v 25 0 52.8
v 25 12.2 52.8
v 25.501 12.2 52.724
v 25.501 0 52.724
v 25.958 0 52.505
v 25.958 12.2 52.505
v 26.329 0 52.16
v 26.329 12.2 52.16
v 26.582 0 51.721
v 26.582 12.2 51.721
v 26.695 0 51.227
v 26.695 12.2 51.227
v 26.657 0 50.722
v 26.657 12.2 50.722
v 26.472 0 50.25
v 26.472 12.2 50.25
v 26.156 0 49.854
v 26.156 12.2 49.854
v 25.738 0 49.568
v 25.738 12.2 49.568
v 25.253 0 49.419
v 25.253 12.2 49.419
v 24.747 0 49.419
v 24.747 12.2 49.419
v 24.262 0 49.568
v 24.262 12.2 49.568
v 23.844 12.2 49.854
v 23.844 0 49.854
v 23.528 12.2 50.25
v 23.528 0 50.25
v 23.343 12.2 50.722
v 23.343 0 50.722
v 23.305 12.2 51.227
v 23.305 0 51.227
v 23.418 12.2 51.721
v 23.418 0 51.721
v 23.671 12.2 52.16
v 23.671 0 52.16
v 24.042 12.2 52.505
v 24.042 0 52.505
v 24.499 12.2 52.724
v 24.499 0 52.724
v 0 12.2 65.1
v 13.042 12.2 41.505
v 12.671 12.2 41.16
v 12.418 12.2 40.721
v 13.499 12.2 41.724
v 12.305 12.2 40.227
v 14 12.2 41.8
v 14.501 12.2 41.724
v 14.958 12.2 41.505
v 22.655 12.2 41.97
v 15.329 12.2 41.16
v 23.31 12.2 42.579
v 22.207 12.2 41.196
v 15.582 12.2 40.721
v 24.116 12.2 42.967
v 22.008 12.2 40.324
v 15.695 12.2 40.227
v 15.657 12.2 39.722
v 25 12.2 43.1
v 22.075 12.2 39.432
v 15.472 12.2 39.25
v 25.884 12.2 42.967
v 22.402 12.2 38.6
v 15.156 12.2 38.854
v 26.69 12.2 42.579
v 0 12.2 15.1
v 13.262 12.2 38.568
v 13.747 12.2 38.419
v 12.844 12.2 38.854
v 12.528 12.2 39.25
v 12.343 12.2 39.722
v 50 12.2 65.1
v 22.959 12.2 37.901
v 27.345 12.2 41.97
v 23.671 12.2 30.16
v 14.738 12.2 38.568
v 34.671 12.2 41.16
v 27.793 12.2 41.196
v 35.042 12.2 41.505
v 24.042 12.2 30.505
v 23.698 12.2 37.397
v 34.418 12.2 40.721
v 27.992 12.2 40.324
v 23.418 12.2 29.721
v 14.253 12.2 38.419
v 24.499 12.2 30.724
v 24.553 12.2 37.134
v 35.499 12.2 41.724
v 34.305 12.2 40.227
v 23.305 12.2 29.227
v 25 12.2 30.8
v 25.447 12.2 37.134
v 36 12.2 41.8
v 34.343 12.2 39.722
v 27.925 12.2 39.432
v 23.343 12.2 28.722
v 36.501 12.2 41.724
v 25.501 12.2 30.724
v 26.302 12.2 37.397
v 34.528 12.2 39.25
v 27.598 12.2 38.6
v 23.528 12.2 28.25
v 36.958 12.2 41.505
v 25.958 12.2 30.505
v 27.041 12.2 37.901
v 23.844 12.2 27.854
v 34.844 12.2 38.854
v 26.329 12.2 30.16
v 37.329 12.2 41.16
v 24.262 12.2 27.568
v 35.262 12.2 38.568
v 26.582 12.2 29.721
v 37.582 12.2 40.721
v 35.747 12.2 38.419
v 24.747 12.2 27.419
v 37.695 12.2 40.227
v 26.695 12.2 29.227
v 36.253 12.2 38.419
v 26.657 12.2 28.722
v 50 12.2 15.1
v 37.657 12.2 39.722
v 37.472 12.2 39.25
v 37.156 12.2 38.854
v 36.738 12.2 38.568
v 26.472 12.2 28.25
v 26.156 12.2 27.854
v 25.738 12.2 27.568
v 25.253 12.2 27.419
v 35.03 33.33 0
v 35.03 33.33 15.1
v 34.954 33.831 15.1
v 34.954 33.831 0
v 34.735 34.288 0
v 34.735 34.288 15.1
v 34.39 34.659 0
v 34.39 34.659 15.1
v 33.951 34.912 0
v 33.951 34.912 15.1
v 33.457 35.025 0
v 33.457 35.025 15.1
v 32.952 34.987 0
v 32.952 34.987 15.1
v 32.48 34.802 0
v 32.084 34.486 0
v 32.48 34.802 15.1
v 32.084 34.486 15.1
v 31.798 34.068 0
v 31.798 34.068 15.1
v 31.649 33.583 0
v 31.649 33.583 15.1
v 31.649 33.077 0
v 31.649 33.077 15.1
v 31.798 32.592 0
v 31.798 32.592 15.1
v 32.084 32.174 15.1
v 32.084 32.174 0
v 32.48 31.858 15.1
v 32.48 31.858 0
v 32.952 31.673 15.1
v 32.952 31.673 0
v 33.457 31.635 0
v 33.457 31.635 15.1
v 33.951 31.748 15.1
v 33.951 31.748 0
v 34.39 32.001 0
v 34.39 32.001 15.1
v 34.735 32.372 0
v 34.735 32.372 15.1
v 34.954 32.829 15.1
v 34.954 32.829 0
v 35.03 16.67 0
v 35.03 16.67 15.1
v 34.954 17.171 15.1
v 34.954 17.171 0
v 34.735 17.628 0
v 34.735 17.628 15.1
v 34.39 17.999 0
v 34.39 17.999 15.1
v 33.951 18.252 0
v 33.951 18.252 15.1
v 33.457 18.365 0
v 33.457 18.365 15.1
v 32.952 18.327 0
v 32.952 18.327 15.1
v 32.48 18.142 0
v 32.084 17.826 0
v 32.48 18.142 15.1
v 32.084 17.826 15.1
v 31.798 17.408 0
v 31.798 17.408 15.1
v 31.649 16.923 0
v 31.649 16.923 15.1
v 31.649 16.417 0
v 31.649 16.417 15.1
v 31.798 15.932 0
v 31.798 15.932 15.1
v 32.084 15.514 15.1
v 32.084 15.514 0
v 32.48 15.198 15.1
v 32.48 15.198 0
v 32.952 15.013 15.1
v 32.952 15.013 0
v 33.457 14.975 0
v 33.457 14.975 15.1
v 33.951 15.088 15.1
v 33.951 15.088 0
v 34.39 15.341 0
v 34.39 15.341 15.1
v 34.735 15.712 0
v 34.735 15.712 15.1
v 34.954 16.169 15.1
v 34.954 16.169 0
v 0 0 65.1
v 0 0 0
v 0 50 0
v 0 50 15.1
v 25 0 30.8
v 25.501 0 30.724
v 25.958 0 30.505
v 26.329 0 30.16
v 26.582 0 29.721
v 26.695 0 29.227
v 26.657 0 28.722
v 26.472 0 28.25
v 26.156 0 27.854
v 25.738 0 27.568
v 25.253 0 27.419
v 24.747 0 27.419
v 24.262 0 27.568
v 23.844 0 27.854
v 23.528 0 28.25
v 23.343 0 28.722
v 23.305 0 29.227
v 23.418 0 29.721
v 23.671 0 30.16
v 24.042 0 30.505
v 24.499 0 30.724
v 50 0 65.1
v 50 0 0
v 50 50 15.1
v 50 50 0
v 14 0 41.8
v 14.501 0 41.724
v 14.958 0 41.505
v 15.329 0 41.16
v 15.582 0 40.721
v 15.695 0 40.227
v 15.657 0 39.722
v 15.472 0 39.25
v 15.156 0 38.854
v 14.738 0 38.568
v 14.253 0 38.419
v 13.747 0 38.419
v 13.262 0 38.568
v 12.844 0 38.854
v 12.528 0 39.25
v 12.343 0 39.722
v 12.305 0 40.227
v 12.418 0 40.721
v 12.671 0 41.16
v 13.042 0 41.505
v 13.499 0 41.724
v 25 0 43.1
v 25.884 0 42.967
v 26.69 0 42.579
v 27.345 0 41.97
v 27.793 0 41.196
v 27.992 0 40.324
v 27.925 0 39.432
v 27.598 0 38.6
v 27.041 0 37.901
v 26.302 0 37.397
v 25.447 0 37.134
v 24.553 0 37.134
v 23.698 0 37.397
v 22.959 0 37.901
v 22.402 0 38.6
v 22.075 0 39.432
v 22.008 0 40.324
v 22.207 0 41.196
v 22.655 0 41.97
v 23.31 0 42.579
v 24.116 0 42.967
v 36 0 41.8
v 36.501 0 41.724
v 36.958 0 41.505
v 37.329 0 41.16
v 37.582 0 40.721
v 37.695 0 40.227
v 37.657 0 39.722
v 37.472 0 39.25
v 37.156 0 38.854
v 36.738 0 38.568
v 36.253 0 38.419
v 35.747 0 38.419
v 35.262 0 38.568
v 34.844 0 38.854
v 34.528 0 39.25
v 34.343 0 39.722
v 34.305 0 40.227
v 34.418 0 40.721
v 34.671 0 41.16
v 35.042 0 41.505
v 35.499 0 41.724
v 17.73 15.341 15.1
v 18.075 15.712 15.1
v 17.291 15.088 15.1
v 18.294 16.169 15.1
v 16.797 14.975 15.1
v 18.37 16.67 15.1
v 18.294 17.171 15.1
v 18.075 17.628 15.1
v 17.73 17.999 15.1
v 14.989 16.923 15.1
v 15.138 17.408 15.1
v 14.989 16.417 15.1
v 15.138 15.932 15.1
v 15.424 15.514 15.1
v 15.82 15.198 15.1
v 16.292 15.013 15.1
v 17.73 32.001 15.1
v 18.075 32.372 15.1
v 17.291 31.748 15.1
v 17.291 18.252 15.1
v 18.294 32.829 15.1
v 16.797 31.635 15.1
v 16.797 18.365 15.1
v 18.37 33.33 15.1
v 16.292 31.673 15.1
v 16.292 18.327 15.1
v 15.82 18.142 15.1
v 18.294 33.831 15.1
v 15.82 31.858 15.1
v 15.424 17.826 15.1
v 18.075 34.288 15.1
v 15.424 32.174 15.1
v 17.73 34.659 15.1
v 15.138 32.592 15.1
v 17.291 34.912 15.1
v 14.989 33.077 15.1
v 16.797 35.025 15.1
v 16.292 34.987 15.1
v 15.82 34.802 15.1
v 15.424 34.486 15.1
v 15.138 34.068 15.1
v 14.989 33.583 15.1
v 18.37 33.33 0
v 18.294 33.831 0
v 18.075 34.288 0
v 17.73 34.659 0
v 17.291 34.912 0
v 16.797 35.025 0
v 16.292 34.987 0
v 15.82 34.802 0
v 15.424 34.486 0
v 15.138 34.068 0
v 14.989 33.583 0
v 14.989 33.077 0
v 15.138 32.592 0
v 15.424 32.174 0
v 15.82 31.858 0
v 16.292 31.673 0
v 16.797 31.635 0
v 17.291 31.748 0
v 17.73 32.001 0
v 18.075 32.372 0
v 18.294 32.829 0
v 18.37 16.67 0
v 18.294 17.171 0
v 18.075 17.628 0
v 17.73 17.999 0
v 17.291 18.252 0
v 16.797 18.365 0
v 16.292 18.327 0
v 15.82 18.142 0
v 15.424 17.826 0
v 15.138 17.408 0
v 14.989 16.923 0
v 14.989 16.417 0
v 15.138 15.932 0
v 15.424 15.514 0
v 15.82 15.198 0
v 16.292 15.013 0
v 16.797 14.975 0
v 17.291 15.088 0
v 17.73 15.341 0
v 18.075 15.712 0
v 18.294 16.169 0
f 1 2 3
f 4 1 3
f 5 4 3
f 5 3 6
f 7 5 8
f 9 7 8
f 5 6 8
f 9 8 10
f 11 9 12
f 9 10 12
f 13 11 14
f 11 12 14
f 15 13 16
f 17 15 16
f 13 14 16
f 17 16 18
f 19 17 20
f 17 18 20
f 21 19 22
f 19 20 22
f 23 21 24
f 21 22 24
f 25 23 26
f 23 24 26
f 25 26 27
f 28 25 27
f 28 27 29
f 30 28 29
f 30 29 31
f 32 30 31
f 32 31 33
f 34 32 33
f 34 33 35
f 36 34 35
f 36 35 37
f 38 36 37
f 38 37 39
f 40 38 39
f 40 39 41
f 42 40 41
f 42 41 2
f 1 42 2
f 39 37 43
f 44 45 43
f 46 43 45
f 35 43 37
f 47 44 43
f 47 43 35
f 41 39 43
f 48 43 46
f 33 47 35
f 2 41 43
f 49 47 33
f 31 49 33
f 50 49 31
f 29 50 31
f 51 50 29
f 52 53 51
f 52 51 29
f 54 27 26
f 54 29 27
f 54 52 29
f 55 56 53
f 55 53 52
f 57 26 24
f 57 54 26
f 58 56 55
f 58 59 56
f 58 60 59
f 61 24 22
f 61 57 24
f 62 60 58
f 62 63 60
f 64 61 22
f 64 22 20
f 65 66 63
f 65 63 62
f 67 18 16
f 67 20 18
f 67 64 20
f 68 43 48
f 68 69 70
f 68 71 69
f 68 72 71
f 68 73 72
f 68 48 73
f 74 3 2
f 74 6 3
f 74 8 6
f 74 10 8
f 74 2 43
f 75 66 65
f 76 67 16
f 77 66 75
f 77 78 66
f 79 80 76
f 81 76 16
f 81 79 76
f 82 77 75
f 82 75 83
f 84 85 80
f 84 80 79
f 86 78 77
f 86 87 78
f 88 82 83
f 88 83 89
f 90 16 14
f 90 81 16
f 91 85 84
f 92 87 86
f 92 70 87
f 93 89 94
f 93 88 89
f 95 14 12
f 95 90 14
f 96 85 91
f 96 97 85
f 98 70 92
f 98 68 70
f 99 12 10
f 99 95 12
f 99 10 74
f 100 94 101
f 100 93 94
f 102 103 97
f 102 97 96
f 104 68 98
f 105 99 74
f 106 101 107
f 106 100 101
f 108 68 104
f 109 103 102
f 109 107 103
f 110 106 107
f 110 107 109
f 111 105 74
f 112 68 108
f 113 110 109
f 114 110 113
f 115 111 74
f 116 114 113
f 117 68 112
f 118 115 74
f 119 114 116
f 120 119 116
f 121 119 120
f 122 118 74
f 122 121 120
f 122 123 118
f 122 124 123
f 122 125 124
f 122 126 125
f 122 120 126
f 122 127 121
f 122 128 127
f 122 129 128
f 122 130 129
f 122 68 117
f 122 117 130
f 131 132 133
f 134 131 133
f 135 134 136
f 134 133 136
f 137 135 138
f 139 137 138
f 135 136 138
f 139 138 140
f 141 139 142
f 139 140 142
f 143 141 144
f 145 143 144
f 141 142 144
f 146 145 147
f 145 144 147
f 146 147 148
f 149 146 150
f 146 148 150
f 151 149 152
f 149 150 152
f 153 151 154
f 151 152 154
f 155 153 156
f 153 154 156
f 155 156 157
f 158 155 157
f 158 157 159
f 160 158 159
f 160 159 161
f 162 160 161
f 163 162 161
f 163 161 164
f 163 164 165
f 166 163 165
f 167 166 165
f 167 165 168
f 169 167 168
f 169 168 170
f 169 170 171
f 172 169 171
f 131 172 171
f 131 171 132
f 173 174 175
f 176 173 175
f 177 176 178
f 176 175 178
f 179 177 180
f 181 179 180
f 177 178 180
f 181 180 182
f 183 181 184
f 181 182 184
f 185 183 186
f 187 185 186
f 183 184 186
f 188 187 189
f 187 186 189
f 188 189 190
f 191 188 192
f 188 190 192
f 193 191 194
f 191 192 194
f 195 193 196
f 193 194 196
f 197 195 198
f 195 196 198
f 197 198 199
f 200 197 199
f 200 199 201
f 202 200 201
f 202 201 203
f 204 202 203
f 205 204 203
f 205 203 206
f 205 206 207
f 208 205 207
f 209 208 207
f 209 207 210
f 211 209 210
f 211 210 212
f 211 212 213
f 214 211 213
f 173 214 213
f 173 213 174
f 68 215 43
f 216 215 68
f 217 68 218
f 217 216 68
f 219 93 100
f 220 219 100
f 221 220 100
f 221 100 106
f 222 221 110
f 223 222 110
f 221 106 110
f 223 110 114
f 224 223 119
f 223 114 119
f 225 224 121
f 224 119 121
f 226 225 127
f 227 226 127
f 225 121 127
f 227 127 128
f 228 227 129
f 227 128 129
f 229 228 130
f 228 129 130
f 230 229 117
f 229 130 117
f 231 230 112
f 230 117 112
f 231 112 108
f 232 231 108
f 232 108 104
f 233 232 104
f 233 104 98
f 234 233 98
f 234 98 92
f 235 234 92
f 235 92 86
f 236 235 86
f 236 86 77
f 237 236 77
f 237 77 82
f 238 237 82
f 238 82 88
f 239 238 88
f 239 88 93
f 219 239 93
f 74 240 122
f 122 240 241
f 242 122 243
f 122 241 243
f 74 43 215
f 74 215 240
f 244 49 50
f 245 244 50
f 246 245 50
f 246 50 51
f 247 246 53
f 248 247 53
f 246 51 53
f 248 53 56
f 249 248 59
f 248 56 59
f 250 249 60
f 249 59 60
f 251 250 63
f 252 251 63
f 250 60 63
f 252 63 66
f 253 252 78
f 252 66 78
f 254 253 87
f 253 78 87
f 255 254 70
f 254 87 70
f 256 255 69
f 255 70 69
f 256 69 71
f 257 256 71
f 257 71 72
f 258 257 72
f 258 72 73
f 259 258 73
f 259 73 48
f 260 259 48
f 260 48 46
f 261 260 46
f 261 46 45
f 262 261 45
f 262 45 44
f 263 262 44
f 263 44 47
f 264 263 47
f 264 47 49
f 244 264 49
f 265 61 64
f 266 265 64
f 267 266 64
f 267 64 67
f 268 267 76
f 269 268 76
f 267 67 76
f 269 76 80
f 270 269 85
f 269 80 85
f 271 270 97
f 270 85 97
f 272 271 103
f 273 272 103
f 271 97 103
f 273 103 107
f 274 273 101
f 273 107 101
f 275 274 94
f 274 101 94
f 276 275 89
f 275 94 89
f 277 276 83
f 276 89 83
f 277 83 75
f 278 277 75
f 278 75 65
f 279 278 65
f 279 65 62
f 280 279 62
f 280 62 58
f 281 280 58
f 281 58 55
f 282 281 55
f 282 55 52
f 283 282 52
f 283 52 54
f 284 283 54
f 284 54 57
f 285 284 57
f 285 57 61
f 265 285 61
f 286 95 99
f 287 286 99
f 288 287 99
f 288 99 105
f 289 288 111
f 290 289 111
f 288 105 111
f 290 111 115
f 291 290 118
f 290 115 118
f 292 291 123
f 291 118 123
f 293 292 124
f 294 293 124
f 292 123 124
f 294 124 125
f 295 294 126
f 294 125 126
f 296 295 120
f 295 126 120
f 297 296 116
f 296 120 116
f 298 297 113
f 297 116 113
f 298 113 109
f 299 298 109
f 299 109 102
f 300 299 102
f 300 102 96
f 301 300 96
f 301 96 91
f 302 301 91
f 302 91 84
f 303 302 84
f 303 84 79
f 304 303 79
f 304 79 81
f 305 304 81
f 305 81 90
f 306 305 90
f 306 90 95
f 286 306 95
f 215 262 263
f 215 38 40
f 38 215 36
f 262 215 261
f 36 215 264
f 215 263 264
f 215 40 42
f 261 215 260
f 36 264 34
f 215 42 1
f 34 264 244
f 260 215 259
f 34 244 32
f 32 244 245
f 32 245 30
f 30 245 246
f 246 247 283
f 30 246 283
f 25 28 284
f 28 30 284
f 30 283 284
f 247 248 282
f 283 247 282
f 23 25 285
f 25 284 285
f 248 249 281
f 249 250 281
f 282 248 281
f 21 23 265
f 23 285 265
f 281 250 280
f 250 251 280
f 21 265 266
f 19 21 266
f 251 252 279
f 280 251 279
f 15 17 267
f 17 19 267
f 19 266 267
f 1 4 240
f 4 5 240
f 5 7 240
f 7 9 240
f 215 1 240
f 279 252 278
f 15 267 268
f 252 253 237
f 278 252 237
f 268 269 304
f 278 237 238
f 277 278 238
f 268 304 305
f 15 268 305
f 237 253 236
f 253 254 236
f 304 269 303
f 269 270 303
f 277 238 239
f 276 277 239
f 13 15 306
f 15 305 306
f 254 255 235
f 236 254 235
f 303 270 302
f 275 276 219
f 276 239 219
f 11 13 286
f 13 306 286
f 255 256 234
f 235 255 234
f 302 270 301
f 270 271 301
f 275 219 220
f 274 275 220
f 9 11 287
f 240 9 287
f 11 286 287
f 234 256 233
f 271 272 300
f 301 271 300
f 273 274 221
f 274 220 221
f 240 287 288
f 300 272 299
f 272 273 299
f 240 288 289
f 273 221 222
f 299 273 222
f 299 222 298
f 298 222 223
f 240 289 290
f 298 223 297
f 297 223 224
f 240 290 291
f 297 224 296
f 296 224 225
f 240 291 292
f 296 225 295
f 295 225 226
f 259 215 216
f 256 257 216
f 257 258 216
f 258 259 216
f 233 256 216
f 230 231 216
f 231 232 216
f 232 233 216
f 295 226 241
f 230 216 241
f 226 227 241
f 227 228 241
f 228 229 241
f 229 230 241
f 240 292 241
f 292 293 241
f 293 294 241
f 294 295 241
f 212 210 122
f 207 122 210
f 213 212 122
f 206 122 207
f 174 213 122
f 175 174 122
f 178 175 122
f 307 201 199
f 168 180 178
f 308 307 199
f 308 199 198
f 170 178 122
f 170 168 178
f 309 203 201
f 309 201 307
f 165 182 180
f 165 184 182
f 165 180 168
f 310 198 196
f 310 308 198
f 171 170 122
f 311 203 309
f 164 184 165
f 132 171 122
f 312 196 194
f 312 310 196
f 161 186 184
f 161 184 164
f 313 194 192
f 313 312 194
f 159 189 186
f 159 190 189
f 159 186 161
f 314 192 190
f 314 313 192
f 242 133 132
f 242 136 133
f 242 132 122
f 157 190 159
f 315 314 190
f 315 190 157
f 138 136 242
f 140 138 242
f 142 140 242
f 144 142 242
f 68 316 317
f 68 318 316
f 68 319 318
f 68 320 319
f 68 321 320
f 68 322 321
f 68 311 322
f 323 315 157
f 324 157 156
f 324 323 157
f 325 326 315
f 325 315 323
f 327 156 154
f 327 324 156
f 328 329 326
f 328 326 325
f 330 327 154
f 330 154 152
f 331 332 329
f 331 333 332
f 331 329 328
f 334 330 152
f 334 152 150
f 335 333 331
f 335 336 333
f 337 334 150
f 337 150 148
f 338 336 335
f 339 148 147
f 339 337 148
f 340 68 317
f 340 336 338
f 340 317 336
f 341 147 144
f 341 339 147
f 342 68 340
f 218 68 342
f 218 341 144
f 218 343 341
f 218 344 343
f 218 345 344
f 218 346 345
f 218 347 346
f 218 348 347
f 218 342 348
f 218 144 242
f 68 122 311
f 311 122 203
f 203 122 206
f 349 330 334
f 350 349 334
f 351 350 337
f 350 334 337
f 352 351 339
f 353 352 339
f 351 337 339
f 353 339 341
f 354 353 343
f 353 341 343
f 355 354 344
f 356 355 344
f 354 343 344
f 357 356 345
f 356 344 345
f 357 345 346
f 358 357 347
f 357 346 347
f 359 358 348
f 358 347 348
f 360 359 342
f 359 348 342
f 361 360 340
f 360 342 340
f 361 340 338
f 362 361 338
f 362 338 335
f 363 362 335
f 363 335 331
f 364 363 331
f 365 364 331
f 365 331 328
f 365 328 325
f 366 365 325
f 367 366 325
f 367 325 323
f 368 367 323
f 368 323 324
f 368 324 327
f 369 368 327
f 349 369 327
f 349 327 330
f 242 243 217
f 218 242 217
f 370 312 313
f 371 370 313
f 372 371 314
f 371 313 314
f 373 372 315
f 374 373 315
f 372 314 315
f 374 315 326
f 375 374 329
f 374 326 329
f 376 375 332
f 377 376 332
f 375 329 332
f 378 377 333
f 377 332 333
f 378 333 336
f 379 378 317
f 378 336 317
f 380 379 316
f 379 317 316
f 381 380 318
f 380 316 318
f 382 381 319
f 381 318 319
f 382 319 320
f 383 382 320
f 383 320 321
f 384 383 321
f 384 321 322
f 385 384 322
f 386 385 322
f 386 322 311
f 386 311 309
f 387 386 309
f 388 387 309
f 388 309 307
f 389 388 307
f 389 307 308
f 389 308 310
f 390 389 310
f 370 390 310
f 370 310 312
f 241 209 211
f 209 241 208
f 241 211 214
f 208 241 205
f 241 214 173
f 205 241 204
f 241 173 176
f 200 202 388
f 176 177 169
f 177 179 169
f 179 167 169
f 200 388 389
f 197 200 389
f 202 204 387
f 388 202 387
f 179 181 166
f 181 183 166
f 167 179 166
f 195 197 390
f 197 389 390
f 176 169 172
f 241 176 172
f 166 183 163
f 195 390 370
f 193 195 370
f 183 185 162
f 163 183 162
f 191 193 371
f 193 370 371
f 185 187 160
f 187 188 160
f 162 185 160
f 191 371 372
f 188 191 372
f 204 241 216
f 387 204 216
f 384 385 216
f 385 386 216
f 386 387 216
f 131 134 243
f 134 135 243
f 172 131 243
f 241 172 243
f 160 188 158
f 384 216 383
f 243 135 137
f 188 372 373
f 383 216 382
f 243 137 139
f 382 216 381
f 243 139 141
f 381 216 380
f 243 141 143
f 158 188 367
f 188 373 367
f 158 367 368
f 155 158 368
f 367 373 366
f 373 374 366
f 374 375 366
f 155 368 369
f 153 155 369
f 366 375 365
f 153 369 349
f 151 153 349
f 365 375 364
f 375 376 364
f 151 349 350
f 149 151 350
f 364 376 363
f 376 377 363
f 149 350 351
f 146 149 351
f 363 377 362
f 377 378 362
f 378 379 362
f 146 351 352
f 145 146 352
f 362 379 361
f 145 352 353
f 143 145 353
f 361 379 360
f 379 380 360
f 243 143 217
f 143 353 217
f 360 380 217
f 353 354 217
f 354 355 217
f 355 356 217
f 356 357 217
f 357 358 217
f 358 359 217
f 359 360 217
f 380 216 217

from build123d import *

# Parameters (mm, degrees)
SKETCH2_W           = 50
SKETCH2_H           = 50
BOSS_EXTRUDE1_DEPTH = 15.1
SKETCH3_R           = 1.7
CUT_EXTRUDE1_DEPTH  = 73.304979082
SKETCH4_W           = 50
SKETCH4_H           = 12.2
BOSS_EXTRUDE2_DEPTH = 50
SKETCH5_R           = 3
SKETCH5_R_2         = 1.7
CUT_EXTRUDE2_DEPTH  = 91.370625759


with BuildPart() as part:
    # Sketch2 → Boss-Extrude1 (new body)
    with BuildSketch(Plane(origin=(0, 0, 0), x_dir=(0, 1, 0), z_dir=(0, 0, 1))):
        with Locations((25, -25)):
            Rectangle(SKETCH2_W, SKETCH2_H)
    extrude(amount=BOSS_EXTRUDE1_DEPTH)

    # Sketch3 → Cut-Extrude1 (cut, through all)
    with BuildSketch(Plane.XY.offset(15.1)):
        with Locations((16.67, 33.33)):
            Circle(SKETCH3_R)
        with Locations((33.33, 33.33)):
            Circle(SKETCH3_R)
        with Locations((16.67, 16.67)):
            Circle(SKETCH3_R)
        with Locations((33.33, 16.67)):
            Circle(SKETCH3_R)
    extrude(amount=-CUT_EXTRUDE1_DEPTH, mode=Mode.SUBTRACT)

    # Sketch4 → Boss-Extrude2 (add)
    with BuildSketch(Plane.XY.offset(15.1)):
        with Locations((25, 6.1)):
            Rectangle(SKETCH4_W, SKETCH4_H)
    extrude(amount=BOSS_EXTRUDE2_DEPTH)

    # Sketch5 → Cut-Extrude2 (cut, through all)
    with BuildSketch(Plane(origin=(0, 12.2, 0), x_dir=(-1, 0, 0), z_dir=(0, 1, 0))):
        with Locations(Location((-25, 40.1, 0), (0, 0, 90))):
            Circle(SKETCH5_R)
        with Locations(Location((-36, 40.1, 0), (0, 0, 90))):
            Circle(SKETCH5_R_2)
        with Locations(Location((-25, 51.1, 0), (0, 0, 90))):
            Circle(SKETCH5_R_2)
        with Locations(Location((-14, 40.1, 0), (0, 0, 90))):
            Circle(SKETCH5_R_2)
        with Locations(Location((-25, 29.1, 0), (0, 0, 90))):
            Circle(SKETCH5_R_2)
    extrude(amount=-CUT_EXTRUDE2_DEPTH, mode=Mode.SUBTRACT)


solid = part.part
